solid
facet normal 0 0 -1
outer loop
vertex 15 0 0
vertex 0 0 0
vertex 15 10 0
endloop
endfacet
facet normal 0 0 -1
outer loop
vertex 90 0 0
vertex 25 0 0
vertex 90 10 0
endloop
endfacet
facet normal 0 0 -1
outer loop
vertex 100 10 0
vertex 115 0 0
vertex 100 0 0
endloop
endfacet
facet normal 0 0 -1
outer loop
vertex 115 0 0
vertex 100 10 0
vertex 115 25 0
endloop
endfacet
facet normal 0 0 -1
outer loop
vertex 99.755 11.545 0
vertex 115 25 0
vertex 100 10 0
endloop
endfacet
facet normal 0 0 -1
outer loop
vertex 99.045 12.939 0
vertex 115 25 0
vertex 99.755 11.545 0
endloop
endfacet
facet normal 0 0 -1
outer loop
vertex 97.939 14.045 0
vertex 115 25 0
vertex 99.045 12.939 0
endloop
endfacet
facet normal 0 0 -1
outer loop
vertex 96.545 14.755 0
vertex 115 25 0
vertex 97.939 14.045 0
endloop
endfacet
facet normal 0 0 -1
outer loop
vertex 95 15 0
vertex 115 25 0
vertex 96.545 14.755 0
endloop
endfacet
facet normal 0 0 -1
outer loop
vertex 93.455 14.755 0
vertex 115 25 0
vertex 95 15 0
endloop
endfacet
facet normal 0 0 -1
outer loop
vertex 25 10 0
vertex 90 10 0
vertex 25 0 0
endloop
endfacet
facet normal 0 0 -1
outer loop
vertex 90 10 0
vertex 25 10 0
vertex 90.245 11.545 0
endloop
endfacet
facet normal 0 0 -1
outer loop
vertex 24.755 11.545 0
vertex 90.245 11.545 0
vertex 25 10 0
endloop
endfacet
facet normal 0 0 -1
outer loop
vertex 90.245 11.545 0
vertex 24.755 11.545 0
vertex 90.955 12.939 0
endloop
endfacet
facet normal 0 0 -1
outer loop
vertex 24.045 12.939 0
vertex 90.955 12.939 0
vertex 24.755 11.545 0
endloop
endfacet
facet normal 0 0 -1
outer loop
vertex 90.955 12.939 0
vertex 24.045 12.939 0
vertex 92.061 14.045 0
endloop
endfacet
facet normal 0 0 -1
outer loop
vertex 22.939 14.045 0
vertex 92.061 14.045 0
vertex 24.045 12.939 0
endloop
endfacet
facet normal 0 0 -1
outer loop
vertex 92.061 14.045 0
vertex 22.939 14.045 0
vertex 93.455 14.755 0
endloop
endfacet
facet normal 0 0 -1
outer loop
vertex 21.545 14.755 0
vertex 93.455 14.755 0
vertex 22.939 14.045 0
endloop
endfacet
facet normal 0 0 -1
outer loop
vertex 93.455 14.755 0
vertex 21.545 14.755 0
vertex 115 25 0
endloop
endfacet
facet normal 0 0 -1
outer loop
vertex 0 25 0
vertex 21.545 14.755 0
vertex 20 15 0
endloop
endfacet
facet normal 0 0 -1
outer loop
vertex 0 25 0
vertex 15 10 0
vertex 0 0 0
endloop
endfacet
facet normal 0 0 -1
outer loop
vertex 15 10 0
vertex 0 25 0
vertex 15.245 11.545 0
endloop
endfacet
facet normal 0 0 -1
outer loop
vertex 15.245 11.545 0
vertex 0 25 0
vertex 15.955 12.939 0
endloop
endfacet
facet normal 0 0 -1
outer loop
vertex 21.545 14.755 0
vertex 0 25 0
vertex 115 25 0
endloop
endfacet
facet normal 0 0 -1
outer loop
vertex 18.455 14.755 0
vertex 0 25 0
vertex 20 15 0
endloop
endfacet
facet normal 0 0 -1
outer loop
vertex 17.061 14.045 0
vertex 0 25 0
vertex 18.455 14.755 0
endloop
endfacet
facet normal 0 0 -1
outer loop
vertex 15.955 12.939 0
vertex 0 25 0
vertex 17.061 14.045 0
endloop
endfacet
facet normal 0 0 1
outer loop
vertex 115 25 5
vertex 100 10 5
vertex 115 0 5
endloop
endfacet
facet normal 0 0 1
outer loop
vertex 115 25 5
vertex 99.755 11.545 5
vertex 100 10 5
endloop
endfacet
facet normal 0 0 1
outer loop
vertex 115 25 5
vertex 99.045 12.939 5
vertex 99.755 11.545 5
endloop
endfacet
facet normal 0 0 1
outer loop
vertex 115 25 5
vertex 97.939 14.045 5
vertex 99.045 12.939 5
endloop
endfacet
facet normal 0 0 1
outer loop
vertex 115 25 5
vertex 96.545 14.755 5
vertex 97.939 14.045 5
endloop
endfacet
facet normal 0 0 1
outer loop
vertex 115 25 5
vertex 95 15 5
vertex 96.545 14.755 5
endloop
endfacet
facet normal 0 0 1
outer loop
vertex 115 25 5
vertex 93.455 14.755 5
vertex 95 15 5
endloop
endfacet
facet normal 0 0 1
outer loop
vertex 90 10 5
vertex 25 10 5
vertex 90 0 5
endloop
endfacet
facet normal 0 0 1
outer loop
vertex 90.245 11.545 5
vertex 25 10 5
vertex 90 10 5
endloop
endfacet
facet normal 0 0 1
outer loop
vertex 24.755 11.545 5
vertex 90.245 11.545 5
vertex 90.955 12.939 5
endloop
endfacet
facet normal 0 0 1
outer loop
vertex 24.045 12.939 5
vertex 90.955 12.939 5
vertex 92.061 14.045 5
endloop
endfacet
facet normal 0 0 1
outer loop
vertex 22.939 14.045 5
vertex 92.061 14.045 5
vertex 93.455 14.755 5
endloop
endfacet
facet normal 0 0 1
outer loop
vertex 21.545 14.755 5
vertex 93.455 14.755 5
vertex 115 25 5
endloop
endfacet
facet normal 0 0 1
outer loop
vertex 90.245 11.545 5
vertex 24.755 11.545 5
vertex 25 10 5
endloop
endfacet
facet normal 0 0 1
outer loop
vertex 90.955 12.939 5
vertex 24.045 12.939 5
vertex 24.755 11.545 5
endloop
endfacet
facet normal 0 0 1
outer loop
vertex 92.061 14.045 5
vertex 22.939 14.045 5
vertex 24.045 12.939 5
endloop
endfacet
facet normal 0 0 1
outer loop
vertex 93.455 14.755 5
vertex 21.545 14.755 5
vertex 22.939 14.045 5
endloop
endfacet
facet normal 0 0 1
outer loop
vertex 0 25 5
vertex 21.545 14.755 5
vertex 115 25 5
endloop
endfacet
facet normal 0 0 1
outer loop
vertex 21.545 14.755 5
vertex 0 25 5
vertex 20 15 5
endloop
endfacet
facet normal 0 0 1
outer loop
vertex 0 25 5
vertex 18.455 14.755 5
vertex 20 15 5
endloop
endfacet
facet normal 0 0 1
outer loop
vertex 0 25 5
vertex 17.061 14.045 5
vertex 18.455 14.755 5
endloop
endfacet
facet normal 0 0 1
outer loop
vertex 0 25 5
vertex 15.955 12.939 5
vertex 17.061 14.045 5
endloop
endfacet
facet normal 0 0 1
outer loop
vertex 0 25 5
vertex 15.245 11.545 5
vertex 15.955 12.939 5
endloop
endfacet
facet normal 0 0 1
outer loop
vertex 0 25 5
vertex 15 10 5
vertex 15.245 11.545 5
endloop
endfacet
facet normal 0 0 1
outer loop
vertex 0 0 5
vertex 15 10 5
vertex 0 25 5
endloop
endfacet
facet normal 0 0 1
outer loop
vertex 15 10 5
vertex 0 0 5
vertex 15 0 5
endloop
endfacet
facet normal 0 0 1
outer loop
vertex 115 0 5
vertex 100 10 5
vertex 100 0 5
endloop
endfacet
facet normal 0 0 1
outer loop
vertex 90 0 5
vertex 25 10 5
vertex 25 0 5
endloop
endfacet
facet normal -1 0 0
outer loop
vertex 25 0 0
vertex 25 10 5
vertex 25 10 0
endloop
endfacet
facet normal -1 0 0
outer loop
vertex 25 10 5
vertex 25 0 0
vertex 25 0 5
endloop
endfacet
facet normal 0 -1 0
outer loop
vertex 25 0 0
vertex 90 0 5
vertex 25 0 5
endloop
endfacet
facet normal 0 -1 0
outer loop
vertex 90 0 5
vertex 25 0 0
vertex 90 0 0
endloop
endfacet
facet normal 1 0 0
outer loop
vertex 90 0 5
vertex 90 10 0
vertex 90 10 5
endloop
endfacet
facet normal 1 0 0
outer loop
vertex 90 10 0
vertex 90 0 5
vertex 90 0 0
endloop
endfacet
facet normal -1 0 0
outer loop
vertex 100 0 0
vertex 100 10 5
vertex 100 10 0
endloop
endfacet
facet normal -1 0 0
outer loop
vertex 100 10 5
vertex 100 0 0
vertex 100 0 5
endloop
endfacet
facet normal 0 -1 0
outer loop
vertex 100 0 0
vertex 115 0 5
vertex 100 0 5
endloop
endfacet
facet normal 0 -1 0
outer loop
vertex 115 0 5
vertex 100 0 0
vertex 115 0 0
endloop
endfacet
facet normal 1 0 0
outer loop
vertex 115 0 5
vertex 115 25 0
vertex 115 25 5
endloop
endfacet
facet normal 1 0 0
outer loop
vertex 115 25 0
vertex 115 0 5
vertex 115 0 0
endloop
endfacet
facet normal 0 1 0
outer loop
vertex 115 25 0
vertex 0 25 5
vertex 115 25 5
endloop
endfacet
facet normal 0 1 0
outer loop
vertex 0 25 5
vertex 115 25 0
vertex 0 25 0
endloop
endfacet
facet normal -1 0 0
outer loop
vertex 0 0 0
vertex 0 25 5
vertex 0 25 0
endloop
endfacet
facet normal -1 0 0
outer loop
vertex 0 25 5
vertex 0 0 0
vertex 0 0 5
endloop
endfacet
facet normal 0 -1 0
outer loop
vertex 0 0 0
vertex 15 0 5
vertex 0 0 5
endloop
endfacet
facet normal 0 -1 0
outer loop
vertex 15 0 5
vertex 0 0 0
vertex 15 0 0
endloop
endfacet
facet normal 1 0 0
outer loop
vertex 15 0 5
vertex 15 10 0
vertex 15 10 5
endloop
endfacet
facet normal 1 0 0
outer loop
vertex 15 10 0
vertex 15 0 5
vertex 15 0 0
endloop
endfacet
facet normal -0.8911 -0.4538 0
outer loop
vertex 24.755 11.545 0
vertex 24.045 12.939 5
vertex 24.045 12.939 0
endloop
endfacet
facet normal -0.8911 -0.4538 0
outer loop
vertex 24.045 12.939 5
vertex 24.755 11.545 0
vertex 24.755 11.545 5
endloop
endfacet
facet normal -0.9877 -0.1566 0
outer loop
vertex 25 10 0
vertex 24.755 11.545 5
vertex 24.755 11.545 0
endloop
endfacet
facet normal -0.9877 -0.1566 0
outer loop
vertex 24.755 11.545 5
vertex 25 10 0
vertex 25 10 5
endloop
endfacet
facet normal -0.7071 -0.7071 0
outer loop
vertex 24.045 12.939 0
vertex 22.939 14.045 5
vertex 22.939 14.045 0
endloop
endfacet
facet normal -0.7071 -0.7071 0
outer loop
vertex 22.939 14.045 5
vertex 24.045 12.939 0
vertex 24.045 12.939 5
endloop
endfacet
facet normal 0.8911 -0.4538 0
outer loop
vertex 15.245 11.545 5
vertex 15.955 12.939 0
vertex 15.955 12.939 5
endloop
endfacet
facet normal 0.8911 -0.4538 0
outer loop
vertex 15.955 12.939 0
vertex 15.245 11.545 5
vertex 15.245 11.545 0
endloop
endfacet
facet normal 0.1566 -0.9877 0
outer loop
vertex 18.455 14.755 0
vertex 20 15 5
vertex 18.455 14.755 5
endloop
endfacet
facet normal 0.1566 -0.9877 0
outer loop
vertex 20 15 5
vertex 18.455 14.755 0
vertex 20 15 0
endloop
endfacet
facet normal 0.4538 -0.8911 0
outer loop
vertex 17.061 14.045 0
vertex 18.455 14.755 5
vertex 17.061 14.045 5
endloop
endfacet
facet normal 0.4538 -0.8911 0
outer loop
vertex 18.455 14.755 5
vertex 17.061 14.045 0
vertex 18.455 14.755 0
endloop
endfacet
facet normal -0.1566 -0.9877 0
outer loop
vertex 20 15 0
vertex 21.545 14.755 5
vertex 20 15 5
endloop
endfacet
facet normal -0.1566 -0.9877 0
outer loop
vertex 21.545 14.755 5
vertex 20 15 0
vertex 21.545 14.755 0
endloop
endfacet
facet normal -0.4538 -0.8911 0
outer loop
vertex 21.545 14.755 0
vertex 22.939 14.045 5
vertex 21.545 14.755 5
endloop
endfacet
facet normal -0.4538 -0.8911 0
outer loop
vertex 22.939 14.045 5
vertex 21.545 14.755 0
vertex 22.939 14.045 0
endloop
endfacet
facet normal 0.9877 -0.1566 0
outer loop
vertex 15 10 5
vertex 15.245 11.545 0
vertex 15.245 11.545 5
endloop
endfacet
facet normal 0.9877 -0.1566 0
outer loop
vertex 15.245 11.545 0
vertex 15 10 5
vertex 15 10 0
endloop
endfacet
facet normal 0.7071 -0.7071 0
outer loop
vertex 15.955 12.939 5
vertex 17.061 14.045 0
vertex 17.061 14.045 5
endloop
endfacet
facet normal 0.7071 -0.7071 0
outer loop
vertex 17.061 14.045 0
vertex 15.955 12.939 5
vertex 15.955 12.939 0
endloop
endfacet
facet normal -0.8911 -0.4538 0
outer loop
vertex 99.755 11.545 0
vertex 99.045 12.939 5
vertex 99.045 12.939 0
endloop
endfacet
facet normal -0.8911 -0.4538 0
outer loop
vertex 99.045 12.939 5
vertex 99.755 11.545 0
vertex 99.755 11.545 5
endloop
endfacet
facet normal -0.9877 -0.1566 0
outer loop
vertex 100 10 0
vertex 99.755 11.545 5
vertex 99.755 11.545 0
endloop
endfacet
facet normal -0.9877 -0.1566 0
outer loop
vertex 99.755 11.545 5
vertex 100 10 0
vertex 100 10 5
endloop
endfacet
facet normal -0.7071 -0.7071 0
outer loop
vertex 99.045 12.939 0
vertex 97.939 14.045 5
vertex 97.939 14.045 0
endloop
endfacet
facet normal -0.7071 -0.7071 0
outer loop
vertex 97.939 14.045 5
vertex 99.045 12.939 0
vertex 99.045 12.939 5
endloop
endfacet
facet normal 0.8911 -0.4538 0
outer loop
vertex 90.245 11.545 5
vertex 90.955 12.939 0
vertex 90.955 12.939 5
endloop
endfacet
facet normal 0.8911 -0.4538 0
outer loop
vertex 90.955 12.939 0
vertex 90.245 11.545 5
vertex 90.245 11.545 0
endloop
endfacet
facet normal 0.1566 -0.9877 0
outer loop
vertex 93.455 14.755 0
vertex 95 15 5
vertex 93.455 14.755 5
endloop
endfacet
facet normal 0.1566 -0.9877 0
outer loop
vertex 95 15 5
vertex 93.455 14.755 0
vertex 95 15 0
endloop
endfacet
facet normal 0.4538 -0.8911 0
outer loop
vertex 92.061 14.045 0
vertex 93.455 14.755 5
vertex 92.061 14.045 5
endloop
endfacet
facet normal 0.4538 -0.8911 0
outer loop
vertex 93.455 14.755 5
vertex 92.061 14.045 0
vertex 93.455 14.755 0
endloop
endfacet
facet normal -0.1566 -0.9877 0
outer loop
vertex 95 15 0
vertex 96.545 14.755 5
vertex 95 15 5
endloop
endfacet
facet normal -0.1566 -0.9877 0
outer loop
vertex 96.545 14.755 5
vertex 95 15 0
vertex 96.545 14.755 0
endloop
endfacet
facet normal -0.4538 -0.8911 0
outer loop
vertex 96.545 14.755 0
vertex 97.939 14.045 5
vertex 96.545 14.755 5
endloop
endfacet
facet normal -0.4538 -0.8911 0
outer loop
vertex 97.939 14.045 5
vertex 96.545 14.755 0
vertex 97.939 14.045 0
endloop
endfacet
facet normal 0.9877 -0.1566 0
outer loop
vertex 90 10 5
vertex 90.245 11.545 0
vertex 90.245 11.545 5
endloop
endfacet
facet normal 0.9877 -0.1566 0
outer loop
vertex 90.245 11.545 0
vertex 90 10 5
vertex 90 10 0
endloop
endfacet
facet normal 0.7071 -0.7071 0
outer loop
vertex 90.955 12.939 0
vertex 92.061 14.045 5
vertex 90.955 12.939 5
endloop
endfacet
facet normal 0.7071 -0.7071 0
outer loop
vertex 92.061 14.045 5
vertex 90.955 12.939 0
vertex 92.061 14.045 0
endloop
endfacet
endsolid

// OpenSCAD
// [FL_INDEX: keywords="openscad, 3d_parametric, Parametric_Cupboard_Door_Holder, csg_solid" | COT="Parametric OpenSCAD design from 3DCodeverse"]
// Title: Parametric Cupboard Door Holder

/*
* Cupboard Doors Holder
* This was designed to prevent my cats from
* Opening my kitchen/bathroom cupboards
* (Yes I've got quite Eveil cats ;) )
*/


/* 
*  Configuration Variables
*/

Thickness = 5 ;
Knob_Width = 10 ;
Inner_Knob_Distance = 65 ;

/* [Hidden] */
Strenght_Factor = 1.5 ;

// End Configuration

module cupboard_doorstop(THICKNESS, KNOB_WIDTH, INNER_KNOB_DISTANCE, STRENGHT_FACTOR)
{
	TOTAL_HEIGHT = KNOB_WIDTH + KNOB_WIDTH*STRENGHT_FACTOR ;
	TOTAL_LENGTH = KNOB_WIDTH*2 + (KNOB_WIDTH*STRENGHT_FACTOR)*2 + INNER_KNOB_DISTANCE ;
	
	difference() {
		difference() {
			linear_extrude(height = THICKNESS, center = false, convexity = 10, twist = 0)
			polygon(points=[[0,0],[0,TOTAL_HEIGHT],[TOTAL_LENGTH,TOTAL_HEIGHT],[TOTAL_LENGTH,0],[TOTAL_LENGTH-(KNOB_WIDTH*STRENGHT_FACTOR),0],[TOTAL_LENGTH-(KNOB_WIDTH*STRENGHT_FACTOR),KNOB_WIDTH],[TOTAL_LENGTH-(KNOB_WIDTH*STRENGHT_FACTOR)-KNOB_WIDTH,KNOB_WIDTH],[TOTAL_LENGTH-(KNOB_WIDTH*STRENGHT_FACTOR)-KNOB_WIDTH,0],[KNOB_WIDTH*STRENGHT_FACTOR+KNOB_WIDTH,0],[KNOB_WIDTH*STRENGHT_FACTOR+KNOB_WIDTH,KNOB_WIDTH],[KNOB_WIDTH*STRENGHT_FACTOR,KNOB_WIDTH],[KNOB_WIDTH*STRENGHT_FACTOR,0]]);
			
			translate([KNOB_WIDTH*STRENGHT_FACTOR+(KNOB_WIDTH/2),KNOB_WIDTH,-0.5])
			cylinder(h= THICKNESS+1, r=KNOB_WIDTH/2, $fn=20) ;
		}
		translate([TOTAL_LENGTH-(KNOB_WIDTH*STRENGHT_FACTOR+(KNOB_WIDTH/2)),KNOB_WIDTH,-0.5])
		cylinder(h= THICKNESS+1, r=KNOB_WIDTH/2, $fn=20) ;
	}
}



// Draw it ;)
cupboard_doorstop(Thickness, Knob_Width, Inner_Knob_Distance, Strenght_Factor);
